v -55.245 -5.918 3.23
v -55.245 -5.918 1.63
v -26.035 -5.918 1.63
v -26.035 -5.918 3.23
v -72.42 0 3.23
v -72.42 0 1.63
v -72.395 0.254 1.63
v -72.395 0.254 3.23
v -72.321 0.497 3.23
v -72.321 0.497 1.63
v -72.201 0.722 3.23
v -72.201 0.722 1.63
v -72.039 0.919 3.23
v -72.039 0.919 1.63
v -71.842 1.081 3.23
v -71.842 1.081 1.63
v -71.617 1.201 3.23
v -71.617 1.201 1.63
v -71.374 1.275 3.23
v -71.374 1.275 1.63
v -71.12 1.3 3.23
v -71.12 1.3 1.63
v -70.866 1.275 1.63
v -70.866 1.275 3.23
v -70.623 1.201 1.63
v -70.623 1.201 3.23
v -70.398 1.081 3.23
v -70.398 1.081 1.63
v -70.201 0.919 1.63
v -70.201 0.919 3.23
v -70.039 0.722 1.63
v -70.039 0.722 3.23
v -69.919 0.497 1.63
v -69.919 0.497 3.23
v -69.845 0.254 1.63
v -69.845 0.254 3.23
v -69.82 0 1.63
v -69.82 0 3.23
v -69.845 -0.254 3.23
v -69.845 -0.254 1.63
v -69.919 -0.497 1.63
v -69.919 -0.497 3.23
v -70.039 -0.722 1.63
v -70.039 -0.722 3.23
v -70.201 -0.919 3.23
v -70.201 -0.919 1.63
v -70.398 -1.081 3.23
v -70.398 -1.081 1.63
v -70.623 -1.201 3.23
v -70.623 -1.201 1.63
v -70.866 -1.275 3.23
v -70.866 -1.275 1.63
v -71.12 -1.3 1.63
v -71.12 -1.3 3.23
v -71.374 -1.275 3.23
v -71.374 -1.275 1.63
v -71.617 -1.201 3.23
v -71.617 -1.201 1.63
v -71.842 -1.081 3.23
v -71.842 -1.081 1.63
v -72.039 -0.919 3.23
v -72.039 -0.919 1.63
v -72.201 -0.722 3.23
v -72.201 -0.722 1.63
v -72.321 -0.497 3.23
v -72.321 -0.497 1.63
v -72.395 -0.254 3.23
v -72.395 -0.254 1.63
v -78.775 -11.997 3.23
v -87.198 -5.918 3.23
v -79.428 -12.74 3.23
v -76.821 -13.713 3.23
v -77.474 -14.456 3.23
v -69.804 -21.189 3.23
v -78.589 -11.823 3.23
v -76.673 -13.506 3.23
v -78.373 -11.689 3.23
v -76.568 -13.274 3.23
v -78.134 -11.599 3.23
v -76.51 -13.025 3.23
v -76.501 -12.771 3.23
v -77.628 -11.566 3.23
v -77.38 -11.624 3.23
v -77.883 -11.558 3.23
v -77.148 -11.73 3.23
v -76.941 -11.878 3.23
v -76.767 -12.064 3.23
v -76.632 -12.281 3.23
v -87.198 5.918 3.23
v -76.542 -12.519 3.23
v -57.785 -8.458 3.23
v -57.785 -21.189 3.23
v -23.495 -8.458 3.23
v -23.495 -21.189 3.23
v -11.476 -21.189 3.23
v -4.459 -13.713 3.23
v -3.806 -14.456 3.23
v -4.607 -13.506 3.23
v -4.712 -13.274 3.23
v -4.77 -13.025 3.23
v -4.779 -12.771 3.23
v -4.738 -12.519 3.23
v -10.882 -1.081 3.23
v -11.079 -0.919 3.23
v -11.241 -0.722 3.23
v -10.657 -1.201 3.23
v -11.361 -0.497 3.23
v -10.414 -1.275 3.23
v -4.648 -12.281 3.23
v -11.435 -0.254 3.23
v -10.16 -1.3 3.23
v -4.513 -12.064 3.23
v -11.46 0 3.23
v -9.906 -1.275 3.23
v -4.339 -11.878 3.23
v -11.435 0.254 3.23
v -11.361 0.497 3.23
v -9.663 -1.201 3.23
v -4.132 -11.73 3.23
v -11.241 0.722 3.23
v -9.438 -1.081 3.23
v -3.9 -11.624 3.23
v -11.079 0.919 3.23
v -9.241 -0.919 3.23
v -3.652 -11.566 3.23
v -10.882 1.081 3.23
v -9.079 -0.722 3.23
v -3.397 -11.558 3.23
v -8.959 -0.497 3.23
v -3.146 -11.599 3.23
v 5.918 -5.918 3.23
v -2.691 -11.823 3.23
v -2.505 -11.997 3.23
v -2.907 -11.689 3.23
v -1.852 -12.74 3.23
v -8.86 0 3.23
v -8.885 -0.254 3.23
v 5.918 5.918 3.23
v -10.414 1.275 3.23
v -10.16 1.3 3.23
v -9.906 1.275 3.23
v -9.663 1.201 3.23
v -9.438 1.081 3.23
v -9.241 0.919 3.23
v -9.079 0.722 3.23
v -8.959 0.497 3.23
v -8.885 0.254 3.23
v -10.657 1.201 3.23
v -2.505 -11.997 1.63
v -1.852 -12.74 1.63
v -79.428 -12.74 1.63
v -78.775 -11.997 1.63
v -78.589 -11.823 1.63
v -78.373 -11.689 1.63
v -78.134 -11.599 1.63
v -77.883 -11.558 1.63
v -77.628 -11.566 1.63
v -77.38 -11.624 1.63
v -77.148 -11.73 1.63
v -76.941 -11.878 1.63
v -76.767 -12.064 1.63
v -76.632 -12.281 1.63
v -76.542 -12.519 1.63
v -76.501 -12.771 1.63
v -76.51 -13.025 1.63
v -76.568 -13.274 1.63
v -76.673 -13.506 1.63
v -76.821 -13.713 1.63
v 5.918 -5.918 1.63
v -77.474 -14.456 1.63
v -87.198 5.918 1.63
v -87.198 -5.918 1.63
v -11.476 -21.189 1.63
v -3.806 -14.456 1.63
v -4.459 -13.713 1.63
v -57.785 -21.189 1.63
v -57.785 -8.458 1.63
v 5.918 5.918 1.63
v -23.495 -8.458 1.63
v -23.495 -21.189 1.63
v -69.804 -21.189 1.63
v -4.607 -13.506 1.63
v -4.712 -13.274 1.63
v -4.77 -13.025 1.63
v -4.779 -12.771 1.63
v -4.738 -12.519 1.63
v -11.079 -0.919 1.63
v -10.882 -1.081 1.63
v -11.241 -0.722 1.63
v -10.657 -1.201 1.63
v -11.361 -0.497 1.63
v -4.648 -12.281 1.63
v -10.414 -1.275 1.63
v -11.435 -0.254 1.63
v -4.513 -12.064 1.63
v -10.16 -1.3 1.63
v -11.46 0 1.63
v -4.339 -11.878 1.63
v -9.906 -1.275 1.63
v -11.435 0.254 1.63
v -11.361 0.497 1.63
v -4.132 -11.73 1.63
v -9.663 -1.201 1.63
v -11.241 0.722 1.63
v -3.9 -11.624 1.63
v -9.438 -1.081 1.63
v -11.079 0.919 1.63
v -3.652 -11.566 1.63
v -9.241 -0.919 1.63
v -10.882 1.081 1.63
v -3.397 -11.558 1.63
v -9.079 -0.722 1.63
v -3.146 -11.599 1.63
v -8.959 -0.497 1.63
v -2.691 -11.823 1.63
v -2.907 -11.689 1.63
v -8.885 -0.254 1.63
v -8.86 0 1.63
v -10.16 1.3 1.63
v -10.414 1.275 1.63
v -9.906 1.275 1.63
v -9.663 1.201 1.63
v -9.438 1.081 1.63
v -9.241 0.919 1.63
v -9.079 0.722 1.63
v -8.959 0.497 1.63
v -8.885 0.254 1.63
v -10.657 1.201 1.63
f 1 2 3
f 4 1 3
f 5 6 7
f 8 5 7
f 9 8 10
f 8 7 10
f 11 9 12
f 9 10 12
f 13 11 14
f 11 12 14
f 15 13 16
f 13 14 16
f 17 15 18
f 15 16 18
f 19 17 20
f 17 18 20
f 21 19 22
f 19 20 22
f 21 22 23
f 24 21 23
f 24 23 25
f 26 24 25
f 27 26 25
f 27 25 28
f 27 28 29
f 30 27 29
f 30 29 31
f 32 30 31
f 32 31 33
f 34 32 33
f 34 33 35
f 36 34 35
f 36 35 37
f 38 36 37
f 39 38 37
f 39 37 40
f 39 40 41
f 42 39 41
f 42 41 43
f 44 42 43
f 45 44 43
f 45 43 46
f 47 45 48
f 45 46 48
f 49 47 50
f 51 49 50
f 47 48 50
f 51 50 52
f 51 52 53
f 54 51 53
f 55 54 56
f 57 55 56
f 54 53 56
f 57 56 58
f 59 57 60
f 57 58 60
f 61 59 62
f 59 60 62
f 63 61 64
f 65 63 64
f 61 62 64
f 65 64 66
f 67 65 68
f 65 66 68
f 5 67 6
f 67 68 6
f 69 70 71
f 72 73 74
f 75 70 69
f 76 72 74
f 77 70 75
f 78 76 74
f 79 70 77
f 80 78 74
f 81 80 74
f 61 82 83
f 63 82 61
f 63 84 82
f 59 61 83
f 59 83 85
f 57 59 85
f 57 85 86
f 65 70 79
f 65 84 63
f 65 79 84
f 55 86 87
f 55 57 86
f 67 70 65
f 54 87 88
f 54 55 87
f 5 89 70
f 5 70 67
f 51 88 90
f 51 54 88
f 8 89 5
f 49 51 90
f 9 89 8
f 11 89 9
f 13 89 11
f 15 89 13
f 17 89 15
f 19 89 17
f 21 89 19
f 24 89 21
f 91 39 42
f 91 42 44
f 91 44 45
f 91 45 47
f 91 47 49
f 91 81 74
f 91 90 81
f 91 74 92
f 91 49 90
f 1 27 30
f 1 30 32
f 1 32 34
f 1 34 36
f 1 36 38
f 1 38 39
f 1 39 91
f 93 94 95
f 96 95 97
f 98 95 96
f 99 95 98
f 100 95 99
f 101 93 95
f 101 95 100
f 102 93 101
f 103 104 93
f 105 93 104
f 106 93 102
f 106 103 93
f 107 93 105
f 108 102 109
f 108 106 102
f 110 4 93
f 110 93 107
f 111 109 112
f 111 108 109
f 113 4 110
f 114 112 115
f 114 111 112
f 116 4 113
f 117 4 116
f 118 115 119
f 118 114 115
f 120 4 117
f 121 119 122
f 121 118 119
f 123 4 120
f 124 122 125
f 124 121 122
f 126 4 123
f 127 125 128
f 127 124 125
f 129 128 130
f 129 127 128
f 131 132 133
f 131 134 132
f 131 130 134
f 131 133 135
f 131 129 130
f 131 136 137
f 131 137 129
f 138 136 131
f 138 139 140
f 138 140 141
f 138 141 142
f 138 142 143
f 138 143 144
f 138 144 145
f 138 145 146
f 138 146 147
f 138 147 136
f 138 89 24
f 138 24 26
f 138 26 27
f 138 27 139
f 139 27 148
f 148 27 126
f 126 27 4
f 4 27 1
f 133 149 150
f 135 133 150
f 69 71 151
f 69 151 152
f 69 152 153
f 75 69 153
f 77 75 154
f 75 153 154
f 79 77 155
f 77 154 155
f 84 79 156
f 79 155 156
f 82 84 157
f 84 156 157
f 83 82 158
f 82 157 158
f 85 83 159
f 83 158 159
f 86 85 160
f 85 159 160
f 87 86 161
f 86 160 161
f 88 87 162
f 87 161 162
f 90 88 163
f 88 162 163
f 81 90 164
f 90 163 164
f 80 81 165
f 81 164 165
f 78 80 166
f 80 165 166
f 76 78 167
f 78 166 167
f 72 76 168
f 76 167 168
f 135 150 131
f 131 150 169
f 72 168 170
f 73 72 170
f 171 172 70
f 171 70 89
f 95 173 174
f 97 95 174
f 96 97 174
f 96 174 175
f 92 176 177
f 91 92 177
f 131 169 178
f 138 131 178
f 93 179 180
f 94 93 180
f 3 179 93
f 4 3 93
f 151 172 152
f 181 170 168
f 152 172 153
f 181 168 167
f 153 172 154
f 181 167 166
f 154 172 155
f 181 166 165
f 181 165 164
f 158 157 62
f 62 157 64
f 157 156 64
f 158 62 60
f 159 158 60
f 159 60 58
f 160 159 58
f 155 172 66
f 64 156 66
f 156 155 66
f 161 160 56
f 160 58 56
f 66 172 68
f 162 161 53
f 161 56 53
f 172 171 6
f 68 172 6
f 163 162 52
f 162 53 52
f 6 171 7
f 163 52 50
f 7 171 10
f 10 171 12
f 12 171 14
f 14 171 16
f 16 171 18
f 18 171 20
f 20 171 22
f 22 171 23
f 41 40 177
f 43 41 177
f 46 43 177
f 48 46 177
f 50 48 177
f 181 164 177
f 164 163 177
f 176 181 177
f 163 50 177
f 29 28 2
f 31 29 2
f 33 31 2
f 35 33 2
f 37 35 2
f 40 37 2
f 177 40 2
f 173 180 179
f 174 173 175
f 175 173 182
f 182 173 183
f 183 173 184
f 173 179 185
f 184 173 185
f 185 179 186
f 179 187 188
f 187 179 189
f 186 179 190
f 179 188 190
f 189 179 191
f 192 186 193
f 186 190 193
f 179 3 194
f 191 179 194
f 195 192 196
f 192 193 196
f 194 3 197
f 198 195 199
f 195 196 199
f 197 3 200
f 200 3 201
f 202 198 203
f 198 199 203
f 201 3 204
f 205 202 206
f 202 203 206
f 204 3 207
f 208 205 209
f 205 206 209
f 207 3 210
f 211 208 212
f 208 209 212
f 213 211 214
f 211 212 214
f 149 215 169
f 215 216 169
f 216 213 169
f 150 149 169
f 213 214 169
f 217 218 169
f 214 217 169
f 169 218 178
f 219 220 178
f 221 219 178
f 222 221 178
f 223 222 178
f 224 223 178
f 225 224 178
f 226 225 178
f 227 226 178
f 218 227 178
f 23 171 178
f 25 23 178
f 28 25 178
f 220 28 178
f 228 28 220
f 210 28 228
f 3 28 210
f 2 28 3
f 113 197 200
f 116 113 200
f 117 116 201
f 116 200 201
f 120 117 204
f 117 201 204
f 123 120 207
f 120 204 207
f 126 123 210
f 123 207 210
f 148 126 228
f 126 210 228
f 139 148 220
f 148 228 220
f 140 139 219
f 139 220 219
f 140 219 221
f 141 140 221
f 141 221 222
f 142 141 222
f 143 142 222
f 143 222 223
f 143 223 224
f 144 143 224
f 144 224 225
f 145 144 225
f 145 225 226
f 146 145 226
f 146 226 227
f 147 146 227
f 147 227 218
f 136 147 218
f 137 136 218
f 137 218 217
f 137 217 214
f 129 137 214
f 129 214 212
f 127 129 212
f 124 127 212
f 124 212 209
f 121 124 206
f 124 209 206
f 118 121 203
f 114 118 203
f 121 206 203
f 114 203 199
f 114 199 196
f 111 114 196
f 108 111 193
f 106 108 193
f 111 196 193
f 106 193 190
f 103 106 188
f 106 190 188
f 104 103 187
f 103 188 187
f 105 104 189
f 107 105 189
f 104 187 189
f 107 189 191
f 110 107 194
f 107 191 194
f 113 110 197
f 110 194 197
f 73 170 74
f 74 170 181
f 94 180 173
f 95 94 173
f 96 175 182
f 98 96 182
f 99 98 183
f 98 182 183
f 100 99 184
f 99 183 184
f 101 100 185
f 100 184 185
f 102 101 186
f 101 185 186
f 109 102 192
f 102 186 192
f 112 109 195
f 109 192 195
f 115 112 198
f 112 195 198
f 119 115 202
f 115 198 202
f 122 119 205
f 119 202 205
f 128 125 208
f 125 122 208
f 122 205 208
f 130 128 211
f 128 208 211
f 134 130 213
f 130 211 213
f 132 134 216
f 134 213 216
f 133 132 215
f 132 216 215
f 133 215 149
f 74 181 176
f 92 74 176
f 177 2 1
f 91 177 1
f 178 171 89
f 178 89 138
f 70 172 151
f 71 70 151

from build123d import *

# Parameters (mm, degrees)
SKETCH1_W                  = 93.116399905
SKETCH1_H                  = 11.836399908
BOSS_EXTRUDE1_DEPTH        = 1.6002
BOSS_EXTRUDE2_DEPTH        = 1.6002
CHAMFER1_SIZE              = 2.54
F_2_6_2_6_DIAMETER_HOLE1_D = 2.6
CUT_EXTRUDE1_DEPTH         = 2.6002


with BuildPart() as part:
    # Sketch1 → Boss-Extrude1 (new body)
    with BuildSketch(Plane.XY.offset(1.63)):
        with Locations((-40.639999999, 0)):
            Rectangle(SKETCH1_W, SKETCH1_H)
    extrude(amount=BOSS_EXTRUDE1_DEPTH)

    # Sketch4 → Boss-Extrude2 (add, through all)
    with BuildSketch(Plane(origin=(0, 0, 1.63), x_dir=(-1, 0, 0), z_dir=(0, 0, -1))):
        Polygon((87.198199951, -5.918199954), (69.803821783, -21.189450144), (57.785000156, -21.189450144), (57.785000156, -5.918199954), align=None)
        Polygon((-5.918199954, -5.918199954), (23.494999841, -5.918199954), (23.494999841, -21.189450144), (11.476178214, -21.189450144), align=None)
    extrude(amount=-BOSS_EXTRUDE2_DEPTH)

    # Chamfer1
    chamfer1_edges = [part.edges().sort_by_distance(p)[0] for p in [
        (-57.785000156, -5.918199954, 2.4301),
        (-23.494999841, -5.918199954, 2.4301),
    ]]
    chamfer(chamfer1_edges, length=CHAMFER1_SIZE)

    # Ø2.6 (2.6) Diameter Hole1 (through all)
    with Locations(Plane.XY.offset(3.2302)):
        with Locations((-10.160000092, -7.6e-08), (-71.119999812, -3.5e-08), (-77.798317195, -12.855075132), (-3.481682742, -12.855075132)):
            Hole(F_2_6_2_6_DIAMETER_HOLE1_D / 2)

    # Sketch6 → Cut-Extrude1 (cut, through all)
    with BuildSketch(Plane(origin=(0, 0, 1.63), x_dir=(-1, 0, 0), z_dir=(0, 0, -1))):
        Polygon((79.427543726, -12.740383202), (78.775241344, -11.997392669), (76.821393045, -13.712757594), (77.473695428, -14.455748127), align=None)
        Polygon((1.852456271, -12.740383202), (3.806304569, -14.455748127), (4.458606952, -13.712757594), (2.504758653, -11.997392669), align=None)
    extrude(amount=-CUT_EXTRUDE1_DEPTH, mode=Mode.SUBTRACT)


solid = part.part
